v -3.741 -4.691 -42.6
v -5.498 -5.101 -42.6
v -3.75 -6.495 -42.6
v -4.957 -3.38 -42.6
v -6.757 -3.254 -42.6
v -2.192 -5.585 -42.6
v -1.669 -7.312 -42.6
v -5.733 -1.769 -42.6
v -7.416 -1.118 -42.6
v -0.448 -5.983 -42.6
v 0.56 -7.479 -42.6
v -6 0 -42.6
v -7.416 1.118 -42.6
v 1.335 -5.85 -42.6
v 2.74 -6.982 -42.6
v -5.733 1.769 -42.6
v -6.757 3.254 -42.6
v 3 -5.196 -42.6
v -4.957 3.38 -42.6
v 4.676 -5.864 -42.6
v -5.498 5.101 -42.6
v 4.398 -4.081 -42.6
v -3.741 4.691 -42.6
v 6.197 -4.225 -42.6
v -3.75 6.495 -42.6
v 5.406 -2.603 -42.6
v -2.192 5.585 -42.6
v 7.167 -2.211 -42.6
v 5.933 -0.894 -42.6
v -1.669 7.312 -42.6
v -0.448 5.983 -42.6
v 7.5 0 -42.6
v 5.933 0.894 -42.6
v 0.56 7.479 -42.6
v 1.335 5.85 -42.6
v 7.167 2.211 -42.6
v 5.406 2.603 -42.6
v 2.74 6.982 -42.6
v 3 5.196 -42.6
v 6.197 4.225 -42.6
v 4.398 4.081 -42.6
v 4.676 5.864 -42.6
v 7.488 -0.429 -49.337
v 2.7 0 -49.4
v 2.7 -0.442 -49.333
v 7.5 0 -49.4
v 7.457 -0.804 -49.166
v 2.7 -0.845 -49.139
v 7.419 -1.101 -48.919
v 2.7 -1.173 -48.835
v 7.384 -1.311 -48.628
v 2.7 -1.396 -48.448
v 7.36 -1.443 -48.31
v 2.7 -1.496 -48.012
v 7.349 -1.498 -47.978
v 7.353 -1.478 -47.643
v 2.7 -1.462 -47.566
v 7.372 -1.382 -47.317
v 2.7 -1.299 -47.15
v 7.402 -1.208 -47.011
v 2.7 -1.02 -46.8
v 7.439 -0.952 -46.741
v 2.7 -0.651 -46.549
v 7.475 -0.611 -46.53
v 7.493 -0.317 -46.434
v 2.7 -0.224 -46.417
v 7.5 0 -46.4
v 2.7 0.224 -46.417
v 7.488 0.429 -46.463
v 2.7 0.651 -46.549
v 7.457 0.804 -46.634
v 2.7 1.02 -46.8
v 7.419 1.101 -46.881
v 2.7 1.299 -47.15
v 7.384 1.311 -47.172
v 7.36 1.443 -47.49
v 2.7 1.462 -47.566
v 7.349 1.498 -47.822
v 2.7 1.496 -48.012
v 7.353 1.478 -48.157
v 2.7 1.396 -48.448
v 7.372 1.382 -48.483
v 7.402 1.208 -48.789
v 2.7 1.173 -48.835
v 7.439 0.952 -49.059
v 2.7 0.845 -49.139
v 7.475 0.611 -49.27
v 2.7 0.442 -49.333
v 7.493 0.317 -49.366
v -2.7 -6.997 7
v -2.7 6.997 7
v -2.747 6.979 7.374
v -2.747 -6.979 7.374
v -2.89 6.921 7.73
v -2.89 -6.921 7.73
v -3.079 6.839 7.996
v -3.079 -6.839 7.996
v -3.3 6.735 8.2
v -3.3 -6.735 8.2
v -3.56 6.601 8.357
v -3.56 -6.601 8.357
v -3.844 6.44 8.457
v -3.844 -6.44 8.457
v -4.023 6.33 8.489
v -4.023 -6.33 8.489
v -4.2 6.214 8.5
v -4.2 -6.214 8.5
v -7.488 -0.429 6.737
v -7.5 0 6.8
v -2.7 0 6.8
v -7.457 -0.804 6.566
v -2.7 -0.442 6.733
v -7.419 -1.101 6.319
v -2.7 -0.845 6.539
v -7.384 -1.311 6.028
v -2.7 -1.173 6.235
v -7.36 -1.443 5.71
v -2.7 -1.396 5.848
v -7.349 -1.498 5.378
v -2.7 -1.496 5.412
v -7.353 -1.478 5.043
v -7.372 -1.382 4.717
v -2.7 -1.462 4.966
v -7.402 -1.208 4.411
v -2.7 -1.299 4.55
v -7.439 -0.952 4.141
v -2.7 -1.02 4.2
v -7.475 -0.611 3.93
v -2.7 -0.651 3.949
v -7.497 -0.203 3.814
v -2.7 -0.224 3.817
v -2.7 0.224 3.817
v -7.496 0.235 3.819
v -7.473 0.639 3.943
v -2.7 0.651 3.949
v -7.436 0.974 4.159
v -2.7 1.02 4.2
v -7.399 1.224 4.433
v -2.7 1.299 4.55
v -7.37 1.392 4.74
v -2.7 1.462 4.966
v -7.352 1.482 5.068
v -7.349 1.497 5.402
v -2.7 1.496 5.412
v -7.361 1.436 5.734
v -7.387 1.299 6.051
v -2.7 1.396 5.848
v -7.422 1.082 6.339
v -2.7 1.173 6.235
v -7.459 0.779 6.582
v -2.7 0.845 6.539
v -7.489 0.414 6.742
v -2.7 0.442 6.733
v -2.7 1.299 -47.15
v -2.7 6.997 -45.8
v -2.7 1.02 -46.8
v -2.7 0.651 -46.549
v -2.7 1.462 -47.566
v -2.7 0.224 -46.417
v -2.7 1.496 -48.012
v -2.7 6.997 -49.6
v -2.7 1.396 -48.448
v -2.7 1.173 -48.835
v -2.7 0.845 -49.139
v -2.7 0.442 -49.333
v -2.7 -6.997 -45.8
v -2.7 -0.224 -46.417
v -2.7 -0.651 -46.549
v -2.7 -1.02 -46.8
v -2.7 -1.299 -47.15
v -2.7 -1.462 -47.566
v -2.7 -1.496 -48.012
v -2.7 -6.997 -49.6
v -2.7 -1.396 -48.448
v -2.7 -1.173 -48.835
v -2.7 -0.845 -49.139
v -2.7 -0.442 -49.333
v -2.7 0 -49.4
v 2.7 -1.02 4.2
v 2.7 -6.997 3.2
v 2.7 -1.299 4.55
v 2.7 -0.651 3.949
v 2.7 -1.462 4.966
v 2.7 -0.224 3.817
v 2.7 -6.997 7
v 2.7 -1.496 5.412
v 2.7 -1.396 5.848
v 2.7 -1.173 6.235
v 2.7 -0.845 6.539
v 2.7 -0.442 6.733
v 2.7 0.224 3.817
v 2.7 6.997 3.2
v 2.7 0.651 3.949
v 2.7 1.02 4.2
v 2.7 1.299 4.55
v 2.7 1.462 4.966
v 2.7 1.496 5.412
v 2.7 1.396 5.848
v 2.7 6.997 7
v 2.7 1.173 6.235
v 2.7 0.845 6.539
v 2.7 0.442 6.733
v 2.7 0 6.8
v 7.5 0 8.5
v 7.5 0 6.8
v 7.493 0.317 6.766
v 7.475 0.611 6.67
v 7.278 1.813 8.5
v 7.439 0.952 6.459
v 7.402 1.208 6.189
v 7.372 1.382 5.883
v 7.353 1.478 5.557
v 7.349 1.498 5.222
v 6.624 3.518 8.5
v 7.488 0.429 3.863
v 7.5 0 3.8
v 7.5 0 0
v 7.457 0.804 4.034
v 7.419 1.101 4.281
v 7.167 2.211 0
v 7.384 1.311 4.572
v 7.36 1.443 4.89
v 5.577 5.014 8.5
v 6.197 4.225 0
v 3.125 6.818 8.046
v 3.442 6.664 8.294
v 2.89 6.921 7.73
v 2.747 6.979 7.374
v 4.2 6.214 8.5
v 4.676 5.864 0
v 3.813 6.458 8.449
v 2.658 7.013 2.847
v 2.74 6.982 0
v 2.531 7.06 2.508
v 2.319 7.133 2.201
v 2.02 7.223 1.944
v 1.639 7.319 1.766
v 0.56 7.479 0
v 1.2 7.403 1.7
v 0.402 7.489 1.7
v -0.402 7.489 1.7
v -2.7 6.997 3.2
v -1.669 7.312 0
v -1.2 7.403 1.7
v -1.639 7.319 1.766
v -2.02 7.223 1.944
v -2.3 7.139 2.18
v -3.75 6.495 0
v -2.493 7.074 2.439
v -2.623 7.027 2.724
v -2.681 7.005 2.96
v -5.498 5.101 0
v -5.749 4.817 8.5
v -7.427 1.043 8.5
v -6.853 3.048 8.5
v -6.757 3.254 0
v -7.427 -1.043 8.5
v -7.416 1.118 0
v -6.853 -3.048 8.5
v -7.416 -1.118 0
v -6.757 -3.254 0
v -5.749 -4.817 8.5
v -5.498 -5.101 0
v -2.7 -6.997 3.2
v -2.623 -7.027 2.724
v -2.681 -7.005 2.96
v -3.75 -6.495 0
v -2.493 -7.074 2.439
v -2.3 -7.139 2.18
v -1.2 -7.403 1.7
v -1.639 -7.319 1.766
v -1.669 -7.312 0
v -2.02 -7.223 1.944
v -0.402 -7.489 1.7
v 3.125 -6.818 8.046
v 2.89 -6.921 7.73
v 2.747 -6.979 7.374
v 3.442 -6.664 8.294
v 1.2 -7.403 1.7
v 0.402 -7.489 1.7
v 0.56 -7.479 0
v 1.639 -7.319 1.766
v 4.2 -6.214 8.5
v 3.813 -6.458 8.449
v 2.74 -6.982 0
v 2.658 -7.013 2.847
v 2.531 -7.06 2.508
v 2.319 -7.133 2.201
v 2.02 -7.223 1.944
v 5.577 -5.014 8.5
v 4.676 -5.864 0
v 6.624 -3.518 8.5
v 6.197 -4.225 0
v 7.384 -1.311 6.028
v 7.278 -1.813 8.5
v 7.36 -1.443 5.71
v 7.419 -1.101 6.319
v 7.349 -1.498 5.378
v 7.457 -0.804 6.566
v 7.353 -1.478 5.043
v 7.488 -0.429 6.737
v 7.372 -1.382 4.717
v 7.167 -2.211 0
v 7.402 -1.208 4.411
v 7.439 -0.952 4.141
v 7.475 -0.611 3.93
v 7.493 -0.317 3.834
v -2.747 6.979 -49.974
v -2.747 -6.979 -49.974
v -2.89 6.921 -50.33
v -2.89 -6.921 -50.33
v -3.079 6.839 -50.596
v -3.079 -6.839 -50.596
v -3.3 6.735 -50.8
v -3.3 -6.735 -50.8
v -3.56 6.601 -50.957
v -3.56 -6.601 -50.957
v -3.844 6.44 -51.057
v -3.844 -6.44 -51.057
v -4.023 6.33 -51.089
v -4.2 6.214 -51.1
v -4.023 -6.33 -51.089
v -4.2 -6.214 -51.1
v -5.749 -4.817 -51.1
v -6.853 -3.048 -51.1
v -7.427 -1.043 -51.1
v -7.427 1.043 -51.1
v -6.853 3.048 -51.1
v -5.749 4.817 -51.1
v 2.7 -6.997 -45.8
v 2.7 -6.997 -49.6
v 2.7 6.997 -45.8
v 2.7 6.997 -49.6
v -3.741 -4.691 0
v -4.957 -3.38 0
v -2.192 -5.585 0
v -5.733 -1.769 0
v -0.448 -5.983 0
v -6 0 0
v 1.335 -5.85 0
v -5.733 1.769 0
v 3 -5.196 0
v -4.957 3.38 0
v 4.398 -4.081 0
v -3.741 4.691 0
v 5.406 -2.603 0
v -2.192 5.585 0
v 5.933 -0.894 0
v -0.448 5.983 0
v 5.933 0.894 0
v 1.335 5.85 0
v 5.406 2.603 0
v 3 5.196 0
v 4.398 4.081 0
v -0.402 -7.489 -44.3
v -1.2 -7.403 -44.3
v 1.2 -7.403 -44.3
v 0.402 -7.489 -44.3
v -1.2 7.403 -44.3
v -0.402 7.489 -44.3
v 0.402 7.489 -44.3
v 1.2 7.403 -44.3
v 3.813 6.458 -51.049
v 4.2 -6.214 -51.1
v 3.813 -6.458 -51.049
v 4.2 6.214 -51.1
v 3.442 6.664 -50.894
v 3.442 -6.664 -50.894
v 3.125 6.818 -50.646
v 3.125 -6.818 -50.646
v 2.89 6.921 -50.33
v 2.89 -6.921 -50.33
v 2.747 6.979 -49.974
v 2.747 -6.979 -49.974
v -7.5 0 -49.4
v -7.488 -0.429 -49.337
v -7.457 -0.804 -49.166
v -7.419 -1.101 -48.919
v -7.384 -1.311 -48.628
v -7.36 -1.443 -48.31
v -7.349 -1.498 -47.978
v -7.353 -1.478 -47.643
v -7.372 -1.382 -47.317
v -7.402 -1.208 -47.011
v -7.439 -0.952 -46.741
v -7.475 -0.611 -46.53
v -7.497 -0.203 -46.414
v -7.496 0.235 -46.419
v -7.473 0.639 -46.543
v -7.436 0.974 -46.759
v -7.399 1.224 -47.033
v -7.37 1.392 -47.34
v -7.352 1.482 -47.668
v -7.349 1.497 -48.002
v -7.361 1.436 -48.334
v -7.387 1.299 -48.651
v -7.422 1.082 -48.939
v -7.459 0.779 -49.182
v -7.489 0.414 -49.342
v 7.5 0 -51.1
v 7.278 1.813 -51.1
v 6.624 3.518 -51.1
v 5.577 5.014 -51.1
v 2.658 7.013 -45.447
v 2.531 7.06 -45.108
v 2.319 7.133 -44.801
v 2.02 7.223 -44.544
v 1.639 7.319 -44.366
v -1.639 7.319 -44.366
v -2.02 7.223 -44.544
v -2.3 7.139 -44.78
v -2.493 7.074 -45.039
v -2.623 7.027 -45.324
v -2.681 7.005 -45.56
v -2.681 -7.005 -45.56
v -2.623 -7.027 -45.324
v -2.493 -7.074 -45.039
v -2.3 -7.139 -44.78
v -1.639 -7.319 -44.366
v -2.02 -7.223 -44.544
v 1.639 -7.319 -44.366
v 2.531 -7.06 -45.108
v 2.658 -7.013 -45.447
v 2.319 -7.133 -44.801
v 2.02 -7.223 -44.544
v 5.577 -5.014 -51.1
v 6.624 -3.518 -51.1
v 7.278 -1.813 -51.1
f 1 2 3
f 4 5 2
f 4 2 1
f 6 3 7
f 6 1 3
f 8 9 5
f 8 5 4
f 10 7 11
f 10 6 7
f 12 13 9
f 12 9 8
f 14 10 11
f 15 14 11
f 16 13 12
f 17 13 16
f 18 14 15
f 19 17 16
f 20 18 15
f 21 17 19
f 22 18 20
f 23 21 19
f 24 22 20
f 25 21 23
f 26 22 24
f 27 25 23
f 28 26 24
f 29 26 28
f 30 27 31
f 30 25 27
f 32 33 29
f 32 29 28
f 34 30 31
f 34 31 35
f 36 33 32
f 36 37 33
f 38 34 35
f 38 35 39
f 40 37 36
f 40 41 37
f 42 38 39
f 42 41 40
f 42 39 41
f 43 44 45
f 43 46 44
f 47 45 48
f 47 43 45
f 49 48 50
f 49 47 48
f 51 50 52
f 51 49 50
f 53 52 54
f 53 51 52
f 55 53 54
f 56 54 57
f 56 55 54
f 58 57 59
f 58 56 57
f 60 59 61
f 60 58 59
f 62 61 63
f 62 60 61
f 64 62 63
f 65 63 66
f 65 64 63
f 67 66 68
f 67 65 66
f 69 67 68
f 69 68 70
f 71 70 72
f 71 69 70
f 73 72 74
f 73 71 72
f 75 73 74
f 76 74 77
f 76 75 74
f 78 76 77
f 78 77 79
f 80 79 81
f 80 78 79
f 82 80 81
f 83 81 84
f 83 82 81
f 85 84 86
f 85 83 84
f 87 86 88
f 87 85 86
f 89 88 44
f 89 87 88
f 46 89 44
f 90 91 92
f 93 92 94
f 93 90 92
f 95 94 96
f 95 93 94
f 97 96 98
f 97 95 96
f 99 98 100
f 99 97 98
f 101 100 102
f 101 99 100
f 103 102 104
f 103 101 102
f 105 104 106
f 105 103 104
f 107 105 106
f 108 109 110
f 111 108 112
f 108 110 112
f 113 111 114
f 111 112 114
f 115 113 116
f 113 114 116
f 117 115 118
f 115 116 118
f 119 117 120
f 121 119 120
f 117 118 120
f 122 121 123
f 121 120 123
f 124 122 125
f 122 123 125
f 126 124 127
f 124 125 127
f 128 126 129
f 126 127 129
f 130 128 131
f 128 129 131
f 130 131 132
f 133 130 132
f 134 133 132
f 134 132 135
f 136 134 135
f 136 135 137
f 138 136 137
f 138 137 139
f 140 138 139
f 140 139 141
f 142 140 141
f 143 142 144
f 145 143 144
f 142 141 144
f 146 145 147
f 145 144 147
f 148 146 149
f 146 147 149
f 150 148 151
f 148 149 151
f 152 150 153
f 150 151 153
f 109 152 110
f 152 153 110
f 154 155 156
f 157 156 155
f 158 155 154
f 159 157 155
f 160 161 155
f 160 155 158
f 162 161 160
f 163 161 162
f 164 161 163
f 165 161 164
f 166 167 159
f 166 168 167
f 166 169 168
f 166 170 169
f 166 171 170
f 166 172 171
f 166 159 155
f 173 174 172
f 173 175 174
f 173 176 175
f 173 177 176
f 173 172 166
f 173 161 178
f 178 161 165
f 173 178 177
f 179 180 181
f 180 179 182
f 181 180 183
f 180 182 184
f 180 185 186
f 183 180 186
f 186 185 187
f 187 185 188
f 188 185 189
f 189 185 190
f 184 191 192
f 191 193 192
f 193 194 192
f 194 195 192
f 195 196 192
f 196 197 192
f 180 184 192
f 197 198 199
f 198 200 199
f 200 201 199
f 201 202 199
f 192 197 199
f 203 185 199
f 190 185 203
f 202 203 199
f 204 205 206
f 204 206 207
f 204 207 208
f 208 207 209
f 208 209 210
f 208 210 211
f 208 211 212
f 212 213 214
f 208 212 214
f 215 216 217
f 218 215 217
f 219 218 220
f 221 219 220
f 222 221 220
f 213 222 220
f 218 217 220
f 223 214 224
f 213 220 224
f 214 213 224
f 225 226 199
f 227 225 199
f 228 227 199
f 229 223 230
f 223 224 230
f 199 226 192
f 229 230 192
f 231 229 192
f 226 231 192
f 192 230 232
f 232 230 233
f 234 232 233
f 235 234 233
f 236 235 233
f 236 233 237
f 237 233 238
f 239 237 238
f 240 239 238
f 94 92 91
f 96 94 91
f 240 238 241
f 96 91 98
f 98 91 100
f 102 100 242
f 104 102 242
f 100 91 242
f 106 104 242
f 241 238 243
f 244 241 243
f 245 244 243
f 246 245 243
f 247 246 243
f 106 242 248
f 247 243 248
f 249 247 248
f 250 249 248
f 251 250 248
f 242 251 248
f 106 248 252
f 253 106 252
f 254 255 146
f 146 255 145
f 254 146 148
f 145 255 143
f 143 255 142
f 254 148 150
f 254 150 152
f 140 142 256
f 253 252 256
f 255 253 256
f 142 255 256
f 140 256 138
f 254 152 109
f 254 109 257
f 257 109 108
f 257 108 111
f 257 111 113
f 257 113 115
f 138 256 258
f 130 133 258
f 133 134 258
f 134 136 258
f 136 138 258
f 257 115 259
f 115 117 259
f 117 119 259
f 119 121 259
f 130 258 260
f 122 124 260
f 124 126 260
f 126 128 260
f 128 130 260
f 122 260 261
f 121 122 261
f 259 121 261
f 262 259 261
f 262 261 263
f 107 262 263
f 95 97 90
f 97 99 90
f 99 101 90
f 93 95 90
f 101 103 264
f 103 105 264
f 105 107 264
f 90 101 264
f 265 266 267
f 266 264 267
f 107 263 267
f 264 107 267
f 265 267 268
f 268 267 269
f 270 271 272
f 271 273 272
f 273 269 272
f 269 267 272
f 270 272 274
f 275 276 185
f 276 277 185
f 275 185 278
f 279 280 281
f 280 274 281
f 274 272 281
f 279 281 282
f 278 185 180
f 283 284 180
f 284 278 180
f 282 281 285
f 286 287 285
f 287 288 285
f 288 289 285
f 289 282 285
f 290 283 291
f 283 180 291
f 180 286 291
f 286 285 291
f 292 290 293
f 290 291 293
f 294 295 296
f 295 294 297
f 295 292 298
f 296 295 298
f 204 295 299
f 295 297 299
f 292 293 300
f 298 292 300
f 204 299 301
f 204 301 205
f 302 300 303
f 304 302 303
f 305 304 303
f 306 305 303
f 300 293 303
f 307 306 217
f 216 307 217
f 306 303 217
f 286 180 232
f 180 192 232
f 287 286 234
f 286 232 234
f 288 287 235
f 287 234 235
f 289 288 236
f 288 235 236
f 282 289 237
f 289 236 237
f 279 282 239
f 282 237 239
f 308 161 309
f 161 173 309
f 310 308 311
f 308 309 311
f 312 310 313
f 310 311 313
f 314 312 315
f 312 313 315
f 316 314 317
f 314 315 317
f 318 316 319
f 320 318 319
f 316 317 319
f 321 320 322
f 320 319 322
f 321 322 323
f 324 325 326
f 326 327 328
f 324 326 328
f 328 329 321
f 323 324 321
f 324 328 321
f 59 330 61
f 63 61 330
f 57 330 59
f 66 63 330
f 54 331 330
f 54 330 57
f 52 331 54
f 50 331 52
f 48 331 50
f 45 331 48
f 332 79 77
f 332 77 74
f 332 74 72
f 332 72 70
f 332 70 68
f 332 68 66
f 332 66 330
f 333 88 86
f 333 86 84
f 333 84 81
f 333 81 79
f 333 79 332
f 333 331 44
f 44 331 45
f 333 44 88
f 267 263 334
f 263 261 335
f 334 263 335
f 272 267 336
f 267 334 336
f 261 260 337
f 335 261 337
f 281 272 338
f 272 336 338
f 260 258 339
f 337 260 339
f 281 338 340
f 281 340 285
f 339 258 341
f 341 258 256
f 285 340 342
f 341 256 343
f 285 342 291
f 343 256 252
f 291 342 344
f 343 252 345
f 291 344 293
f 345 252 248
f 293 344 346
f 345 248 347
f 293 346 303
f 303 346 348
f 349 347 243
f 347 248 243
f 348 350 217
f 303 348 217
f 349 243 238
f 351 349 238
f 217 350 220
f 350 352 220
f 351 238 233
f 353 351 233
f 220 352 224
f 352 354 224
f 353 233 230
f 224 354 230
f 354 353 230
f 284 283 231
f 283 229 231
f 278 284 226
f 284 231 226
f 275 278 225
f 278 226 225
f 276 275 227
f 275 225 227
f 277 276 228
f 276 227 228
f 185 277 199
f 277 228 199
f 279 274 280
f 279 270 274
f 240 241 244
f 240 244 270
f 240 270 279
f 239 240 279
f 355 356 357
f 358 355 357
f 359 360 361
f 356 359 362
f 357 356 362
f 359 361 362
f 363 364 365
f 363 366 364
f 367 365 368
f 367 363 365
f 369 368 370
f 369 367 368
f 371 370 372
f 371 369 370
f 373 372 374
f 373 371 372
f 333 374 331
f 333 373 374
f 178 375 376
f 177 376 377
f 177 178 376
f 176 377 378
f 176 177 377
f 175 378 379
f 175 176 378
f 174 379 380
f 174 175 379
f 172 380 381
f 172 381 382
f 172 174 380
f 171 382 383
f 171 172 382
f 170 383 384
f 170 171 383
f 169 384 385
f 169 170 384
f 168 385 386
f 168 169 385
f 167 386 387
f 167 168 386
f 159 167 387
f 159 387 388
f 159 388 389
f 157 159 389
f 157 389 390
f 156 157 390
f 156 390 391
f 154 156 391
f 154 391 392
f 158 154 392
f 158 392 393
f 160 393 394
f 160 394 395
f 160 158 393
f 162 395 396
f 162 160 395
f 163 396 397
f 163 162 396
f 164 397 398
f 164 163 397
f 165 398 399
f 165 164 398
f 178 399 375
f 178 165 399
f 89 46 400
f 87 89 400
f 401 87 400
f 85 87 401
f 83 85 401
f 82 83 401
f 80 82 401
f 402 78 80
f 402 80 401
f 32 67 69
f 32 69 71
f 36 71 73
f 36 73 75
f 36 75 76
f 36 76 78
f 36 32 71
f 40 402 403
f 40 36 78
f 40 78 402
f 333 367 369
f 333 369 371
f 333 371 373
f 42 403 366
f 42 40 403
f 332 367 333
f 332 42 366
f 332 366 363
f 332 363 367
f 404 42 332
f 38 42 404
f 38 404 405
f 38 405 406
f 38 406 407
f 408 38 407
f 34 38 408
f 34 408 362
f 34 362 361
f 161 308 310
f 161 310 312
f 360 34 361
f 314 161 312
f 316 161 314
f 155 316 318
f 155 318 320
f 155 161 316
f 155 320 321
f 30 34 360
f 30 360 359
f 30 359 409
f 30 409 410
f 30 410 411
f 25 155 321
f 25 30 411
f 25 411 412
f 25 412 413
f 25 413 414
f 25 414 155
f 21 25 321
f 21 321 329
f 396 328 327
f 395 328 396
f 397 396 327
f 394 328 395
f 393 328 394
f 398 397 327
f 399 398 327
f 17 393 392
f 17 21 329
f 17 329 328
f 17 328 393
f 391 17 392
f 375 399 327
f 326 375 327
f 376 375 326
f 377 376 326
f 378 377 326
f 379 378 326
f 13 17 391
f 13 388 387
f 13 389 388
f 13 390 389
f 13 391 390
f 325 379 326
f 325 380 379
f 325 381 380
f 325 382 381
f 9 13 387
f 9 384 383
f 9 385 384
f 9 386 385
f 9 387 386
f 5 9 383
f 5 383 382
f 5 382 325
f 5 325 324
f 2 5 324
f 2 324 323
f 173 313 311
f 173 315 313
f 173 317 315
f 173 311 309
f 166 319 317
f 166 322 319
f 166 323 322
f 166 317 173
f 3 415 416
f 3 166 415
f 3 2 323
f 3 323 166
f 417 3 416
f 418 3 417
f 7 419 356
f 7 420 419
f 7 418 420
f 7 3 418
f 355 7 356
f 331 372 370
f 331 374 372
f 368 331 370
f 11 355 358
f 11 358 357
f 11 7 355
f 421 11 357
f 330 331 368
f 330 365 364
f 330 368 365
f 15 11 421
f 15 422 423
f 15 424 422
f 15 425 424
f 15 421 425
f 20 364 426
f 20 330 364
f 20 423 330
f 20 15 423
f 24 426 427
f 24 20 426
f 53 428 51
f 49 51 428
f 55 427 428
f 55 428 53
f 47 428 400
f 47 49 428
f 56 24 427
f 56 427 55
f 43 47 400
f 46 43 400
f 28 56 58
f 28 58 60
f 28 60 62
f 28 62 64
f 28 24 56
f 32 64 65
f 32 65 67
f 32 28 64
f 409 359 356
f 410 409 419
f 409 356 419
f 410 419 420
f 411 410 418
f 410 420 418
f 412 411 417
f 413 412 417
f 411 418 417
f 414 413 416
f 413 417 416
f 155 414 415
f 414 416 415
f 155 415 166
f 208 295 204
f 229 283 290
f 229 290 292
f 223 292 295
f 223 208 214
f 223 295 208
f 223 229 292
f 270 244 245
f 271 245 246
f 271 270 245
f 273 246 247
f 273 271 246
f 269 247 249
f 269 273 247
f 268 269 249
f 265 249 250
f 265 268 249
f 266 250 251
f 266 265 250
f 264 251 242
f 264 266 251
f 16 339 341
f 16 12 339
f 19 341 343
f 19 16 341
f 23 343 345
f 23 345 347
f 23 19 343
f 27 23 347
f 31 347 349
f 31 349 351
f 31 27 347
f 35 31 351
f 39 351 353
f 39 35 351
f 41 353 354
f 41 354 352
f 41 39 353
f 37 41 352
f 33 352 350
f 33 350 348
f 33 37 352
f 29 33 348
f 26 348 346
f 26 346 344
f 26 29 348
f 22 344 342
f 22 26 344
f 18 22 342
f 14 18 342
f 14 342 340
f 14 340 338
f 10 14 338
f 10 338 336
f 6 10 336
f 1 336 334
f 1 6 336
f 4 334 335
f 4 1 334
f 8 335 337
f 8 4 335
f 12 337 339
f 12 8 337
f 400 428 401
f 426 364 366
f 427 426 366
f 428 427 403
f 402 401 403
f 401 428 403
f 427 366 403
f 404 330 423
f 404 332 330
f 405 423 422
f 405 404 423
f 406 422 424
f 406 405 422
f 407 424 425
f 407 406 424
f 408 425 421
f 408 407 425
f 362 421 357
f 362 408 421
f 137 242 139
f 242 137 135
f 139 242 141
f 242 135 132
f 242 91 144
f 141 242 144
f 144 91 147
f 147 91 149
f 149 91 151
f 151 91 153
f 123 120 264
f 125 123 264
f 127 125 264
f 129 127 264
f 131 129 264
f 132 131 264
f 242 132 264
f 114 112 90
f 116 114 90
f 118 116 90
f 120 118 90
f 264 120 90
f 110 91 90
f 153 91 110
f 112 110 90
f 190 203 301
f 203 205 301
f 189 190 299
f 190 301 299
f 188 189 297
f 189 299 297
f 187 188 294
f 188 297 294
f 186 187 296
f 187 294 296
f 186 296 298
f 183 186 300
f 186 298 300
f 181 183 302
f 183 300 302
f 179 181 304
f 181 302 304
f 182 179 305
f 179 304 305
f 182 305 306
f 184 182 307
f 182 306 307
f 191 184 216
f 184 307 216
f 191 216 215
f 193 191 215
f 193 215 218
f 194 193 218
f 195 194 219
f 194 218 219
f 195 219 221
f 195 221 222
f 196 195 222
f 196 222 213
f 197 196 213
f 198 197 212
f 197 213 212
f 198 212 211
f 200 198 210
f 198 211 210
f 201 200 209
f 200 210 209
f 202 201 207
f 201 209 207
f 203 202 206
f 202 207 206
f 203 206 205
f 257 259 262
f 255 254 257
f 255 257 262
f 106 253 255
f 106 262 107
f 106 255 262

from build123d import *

# Parameters (mm, degrees)
SKETCH1_R                       = 7.5
BOSS_EXTRUDE1_DEPTH             = 8.5
CUT_EXTRUDE1_DEPTH              = 6.8
SKETCH3_R                       = 1.5
CUT_EXTRUDE2_DEPTH              = 16.249262277
FILLET1_R                       = 1.5
SKETCH5_R                       = 6
BOSS_EXTRUDE3_DEPTH             = 21.3
BOSS_EXTRUDE3_DIRECTION_2_REACH = 33.631
FILLET1_OF_MIRROR1_R            = 1.5


with BuildPart() as part:
    # Sketch1 → Boss-Extrude1 (new body)
    with BuildSketch(Plane.XY):
        Circle(SKETCH1_R)
    boss_extrude1 = extrude(amount=BOSS_EXTRUDE1_DEPTH)

    # Sketch2 → Cut-Extrude1 (cut)
    with BuildSketch(Plane.XY.offset(8.5)):
        Polygon((2.7, 0), (2.7, 13.78279584), (-2.7, 13.78279584), (-2.7, 0), (-2.7, -14.12853377), (2.7, -14.12853377), align=None)
    cut_extrude1 = extrude(amount=-CUT_EXTRUDE1_DEPTH, mode=Mode.SUBTRACT)

    # Sketch3 → Cut-Extrude2 (cut, symmetric)
    with BuildSketch(Plane(origin=(-2.7, 0, 0), x_dir=(0, 0, -1), z_dir=(1, 0, 0))):
        with Locations(Location((-5.3, 0, 0), (0, 0, 180))):
            Circle(SKETCH3_R)
    cut_extrude2 = extrude(amount=CUT_EXTRUDE2_DEPTH, both=True, mode=Mode.SUBTRACT)

    # Fillet1
    fillet1_edges = [part.edges().sort_by_distance(p)[0] for p in [
        (-2.7, 0, 1.7),
        (2.7, 0, 1.7),
        (2.7, 0, 8.5),
        (-2.7, 0, 8.5),
    ]]
    fillet(fillet1_edges, radius=FILLET1_R)

    # Sketch5 → Boss-Extrude3 (add)
    with BuildSketch(Plane(origin=(0, 0, -21.3), x_dir=(-1, 0, 0), z_dir=(0, 0, -1))):
        Circle(SKETCH5_R)
    extrude(amount=BOSS_EXTRUDE3_DEPTH)

    # Sketch5 → Boss-Extrude3 direction 2 (add, up to next)
    with BuildSketch(Plane(origin=(0, 0, -21.3), x_dir=(-1, 0, 0), z_dir=(0, 0, -1)), mode=Mode.PRIVATE) as boss_extrude3_direction_2_sk1:
        Circle(SKETCH5_R)
    boss_extrude3_direction_2_tool1 = extrude(boss_extrude3_direction_2_sk1.sketch, amount=-BOSS_EXTRUDE3_DIRECTION_2_REACH, mode=Mode.PRIVATE) - part.part
    add(boss_extrude3_direction_2_tool1.solids().sort_by_distance((0, 0, -21.3))[0])

    # Mirror1: Boss-Extrude1, Cut-Extrude1, Cut-Extrude2 across plane
    add(boss_extrude1.mirror(Plane(origin=(0, 0, -21.3), x_dir=(1, 0, 0), z_dir=(0, 0, -1))))
    add(cut_extrude1.mirror(Plane(origin=(0, 0, -21.3), x_dir=(1, 0, 0), z_dir=(0, 0, -1))), mode=Mode.SUBTRACT)
    add(cut_extrude2.mirror(Plane(origin=(0, 0, -21.3), x_dir=(1, 0, 0), z_dir=(0, 0, -1))), mode=Mode.SUBTRACT)

    # Fillet1 of Mirror1
    fillet1_of_mirror1_edges = [part.edges().sort_by_distance(p)[0] for p in [
        (-2.7, 0, -44.3),
        (2.7, 0, -44.3),
        (2.7, 0, -51.1),
        (-2.7, 0, -51.1),
    ]]
    fillet(fillet1_of_mirror1_edges, radius=FILLET1_OF_MIRROR1_R)


solid = part.part
